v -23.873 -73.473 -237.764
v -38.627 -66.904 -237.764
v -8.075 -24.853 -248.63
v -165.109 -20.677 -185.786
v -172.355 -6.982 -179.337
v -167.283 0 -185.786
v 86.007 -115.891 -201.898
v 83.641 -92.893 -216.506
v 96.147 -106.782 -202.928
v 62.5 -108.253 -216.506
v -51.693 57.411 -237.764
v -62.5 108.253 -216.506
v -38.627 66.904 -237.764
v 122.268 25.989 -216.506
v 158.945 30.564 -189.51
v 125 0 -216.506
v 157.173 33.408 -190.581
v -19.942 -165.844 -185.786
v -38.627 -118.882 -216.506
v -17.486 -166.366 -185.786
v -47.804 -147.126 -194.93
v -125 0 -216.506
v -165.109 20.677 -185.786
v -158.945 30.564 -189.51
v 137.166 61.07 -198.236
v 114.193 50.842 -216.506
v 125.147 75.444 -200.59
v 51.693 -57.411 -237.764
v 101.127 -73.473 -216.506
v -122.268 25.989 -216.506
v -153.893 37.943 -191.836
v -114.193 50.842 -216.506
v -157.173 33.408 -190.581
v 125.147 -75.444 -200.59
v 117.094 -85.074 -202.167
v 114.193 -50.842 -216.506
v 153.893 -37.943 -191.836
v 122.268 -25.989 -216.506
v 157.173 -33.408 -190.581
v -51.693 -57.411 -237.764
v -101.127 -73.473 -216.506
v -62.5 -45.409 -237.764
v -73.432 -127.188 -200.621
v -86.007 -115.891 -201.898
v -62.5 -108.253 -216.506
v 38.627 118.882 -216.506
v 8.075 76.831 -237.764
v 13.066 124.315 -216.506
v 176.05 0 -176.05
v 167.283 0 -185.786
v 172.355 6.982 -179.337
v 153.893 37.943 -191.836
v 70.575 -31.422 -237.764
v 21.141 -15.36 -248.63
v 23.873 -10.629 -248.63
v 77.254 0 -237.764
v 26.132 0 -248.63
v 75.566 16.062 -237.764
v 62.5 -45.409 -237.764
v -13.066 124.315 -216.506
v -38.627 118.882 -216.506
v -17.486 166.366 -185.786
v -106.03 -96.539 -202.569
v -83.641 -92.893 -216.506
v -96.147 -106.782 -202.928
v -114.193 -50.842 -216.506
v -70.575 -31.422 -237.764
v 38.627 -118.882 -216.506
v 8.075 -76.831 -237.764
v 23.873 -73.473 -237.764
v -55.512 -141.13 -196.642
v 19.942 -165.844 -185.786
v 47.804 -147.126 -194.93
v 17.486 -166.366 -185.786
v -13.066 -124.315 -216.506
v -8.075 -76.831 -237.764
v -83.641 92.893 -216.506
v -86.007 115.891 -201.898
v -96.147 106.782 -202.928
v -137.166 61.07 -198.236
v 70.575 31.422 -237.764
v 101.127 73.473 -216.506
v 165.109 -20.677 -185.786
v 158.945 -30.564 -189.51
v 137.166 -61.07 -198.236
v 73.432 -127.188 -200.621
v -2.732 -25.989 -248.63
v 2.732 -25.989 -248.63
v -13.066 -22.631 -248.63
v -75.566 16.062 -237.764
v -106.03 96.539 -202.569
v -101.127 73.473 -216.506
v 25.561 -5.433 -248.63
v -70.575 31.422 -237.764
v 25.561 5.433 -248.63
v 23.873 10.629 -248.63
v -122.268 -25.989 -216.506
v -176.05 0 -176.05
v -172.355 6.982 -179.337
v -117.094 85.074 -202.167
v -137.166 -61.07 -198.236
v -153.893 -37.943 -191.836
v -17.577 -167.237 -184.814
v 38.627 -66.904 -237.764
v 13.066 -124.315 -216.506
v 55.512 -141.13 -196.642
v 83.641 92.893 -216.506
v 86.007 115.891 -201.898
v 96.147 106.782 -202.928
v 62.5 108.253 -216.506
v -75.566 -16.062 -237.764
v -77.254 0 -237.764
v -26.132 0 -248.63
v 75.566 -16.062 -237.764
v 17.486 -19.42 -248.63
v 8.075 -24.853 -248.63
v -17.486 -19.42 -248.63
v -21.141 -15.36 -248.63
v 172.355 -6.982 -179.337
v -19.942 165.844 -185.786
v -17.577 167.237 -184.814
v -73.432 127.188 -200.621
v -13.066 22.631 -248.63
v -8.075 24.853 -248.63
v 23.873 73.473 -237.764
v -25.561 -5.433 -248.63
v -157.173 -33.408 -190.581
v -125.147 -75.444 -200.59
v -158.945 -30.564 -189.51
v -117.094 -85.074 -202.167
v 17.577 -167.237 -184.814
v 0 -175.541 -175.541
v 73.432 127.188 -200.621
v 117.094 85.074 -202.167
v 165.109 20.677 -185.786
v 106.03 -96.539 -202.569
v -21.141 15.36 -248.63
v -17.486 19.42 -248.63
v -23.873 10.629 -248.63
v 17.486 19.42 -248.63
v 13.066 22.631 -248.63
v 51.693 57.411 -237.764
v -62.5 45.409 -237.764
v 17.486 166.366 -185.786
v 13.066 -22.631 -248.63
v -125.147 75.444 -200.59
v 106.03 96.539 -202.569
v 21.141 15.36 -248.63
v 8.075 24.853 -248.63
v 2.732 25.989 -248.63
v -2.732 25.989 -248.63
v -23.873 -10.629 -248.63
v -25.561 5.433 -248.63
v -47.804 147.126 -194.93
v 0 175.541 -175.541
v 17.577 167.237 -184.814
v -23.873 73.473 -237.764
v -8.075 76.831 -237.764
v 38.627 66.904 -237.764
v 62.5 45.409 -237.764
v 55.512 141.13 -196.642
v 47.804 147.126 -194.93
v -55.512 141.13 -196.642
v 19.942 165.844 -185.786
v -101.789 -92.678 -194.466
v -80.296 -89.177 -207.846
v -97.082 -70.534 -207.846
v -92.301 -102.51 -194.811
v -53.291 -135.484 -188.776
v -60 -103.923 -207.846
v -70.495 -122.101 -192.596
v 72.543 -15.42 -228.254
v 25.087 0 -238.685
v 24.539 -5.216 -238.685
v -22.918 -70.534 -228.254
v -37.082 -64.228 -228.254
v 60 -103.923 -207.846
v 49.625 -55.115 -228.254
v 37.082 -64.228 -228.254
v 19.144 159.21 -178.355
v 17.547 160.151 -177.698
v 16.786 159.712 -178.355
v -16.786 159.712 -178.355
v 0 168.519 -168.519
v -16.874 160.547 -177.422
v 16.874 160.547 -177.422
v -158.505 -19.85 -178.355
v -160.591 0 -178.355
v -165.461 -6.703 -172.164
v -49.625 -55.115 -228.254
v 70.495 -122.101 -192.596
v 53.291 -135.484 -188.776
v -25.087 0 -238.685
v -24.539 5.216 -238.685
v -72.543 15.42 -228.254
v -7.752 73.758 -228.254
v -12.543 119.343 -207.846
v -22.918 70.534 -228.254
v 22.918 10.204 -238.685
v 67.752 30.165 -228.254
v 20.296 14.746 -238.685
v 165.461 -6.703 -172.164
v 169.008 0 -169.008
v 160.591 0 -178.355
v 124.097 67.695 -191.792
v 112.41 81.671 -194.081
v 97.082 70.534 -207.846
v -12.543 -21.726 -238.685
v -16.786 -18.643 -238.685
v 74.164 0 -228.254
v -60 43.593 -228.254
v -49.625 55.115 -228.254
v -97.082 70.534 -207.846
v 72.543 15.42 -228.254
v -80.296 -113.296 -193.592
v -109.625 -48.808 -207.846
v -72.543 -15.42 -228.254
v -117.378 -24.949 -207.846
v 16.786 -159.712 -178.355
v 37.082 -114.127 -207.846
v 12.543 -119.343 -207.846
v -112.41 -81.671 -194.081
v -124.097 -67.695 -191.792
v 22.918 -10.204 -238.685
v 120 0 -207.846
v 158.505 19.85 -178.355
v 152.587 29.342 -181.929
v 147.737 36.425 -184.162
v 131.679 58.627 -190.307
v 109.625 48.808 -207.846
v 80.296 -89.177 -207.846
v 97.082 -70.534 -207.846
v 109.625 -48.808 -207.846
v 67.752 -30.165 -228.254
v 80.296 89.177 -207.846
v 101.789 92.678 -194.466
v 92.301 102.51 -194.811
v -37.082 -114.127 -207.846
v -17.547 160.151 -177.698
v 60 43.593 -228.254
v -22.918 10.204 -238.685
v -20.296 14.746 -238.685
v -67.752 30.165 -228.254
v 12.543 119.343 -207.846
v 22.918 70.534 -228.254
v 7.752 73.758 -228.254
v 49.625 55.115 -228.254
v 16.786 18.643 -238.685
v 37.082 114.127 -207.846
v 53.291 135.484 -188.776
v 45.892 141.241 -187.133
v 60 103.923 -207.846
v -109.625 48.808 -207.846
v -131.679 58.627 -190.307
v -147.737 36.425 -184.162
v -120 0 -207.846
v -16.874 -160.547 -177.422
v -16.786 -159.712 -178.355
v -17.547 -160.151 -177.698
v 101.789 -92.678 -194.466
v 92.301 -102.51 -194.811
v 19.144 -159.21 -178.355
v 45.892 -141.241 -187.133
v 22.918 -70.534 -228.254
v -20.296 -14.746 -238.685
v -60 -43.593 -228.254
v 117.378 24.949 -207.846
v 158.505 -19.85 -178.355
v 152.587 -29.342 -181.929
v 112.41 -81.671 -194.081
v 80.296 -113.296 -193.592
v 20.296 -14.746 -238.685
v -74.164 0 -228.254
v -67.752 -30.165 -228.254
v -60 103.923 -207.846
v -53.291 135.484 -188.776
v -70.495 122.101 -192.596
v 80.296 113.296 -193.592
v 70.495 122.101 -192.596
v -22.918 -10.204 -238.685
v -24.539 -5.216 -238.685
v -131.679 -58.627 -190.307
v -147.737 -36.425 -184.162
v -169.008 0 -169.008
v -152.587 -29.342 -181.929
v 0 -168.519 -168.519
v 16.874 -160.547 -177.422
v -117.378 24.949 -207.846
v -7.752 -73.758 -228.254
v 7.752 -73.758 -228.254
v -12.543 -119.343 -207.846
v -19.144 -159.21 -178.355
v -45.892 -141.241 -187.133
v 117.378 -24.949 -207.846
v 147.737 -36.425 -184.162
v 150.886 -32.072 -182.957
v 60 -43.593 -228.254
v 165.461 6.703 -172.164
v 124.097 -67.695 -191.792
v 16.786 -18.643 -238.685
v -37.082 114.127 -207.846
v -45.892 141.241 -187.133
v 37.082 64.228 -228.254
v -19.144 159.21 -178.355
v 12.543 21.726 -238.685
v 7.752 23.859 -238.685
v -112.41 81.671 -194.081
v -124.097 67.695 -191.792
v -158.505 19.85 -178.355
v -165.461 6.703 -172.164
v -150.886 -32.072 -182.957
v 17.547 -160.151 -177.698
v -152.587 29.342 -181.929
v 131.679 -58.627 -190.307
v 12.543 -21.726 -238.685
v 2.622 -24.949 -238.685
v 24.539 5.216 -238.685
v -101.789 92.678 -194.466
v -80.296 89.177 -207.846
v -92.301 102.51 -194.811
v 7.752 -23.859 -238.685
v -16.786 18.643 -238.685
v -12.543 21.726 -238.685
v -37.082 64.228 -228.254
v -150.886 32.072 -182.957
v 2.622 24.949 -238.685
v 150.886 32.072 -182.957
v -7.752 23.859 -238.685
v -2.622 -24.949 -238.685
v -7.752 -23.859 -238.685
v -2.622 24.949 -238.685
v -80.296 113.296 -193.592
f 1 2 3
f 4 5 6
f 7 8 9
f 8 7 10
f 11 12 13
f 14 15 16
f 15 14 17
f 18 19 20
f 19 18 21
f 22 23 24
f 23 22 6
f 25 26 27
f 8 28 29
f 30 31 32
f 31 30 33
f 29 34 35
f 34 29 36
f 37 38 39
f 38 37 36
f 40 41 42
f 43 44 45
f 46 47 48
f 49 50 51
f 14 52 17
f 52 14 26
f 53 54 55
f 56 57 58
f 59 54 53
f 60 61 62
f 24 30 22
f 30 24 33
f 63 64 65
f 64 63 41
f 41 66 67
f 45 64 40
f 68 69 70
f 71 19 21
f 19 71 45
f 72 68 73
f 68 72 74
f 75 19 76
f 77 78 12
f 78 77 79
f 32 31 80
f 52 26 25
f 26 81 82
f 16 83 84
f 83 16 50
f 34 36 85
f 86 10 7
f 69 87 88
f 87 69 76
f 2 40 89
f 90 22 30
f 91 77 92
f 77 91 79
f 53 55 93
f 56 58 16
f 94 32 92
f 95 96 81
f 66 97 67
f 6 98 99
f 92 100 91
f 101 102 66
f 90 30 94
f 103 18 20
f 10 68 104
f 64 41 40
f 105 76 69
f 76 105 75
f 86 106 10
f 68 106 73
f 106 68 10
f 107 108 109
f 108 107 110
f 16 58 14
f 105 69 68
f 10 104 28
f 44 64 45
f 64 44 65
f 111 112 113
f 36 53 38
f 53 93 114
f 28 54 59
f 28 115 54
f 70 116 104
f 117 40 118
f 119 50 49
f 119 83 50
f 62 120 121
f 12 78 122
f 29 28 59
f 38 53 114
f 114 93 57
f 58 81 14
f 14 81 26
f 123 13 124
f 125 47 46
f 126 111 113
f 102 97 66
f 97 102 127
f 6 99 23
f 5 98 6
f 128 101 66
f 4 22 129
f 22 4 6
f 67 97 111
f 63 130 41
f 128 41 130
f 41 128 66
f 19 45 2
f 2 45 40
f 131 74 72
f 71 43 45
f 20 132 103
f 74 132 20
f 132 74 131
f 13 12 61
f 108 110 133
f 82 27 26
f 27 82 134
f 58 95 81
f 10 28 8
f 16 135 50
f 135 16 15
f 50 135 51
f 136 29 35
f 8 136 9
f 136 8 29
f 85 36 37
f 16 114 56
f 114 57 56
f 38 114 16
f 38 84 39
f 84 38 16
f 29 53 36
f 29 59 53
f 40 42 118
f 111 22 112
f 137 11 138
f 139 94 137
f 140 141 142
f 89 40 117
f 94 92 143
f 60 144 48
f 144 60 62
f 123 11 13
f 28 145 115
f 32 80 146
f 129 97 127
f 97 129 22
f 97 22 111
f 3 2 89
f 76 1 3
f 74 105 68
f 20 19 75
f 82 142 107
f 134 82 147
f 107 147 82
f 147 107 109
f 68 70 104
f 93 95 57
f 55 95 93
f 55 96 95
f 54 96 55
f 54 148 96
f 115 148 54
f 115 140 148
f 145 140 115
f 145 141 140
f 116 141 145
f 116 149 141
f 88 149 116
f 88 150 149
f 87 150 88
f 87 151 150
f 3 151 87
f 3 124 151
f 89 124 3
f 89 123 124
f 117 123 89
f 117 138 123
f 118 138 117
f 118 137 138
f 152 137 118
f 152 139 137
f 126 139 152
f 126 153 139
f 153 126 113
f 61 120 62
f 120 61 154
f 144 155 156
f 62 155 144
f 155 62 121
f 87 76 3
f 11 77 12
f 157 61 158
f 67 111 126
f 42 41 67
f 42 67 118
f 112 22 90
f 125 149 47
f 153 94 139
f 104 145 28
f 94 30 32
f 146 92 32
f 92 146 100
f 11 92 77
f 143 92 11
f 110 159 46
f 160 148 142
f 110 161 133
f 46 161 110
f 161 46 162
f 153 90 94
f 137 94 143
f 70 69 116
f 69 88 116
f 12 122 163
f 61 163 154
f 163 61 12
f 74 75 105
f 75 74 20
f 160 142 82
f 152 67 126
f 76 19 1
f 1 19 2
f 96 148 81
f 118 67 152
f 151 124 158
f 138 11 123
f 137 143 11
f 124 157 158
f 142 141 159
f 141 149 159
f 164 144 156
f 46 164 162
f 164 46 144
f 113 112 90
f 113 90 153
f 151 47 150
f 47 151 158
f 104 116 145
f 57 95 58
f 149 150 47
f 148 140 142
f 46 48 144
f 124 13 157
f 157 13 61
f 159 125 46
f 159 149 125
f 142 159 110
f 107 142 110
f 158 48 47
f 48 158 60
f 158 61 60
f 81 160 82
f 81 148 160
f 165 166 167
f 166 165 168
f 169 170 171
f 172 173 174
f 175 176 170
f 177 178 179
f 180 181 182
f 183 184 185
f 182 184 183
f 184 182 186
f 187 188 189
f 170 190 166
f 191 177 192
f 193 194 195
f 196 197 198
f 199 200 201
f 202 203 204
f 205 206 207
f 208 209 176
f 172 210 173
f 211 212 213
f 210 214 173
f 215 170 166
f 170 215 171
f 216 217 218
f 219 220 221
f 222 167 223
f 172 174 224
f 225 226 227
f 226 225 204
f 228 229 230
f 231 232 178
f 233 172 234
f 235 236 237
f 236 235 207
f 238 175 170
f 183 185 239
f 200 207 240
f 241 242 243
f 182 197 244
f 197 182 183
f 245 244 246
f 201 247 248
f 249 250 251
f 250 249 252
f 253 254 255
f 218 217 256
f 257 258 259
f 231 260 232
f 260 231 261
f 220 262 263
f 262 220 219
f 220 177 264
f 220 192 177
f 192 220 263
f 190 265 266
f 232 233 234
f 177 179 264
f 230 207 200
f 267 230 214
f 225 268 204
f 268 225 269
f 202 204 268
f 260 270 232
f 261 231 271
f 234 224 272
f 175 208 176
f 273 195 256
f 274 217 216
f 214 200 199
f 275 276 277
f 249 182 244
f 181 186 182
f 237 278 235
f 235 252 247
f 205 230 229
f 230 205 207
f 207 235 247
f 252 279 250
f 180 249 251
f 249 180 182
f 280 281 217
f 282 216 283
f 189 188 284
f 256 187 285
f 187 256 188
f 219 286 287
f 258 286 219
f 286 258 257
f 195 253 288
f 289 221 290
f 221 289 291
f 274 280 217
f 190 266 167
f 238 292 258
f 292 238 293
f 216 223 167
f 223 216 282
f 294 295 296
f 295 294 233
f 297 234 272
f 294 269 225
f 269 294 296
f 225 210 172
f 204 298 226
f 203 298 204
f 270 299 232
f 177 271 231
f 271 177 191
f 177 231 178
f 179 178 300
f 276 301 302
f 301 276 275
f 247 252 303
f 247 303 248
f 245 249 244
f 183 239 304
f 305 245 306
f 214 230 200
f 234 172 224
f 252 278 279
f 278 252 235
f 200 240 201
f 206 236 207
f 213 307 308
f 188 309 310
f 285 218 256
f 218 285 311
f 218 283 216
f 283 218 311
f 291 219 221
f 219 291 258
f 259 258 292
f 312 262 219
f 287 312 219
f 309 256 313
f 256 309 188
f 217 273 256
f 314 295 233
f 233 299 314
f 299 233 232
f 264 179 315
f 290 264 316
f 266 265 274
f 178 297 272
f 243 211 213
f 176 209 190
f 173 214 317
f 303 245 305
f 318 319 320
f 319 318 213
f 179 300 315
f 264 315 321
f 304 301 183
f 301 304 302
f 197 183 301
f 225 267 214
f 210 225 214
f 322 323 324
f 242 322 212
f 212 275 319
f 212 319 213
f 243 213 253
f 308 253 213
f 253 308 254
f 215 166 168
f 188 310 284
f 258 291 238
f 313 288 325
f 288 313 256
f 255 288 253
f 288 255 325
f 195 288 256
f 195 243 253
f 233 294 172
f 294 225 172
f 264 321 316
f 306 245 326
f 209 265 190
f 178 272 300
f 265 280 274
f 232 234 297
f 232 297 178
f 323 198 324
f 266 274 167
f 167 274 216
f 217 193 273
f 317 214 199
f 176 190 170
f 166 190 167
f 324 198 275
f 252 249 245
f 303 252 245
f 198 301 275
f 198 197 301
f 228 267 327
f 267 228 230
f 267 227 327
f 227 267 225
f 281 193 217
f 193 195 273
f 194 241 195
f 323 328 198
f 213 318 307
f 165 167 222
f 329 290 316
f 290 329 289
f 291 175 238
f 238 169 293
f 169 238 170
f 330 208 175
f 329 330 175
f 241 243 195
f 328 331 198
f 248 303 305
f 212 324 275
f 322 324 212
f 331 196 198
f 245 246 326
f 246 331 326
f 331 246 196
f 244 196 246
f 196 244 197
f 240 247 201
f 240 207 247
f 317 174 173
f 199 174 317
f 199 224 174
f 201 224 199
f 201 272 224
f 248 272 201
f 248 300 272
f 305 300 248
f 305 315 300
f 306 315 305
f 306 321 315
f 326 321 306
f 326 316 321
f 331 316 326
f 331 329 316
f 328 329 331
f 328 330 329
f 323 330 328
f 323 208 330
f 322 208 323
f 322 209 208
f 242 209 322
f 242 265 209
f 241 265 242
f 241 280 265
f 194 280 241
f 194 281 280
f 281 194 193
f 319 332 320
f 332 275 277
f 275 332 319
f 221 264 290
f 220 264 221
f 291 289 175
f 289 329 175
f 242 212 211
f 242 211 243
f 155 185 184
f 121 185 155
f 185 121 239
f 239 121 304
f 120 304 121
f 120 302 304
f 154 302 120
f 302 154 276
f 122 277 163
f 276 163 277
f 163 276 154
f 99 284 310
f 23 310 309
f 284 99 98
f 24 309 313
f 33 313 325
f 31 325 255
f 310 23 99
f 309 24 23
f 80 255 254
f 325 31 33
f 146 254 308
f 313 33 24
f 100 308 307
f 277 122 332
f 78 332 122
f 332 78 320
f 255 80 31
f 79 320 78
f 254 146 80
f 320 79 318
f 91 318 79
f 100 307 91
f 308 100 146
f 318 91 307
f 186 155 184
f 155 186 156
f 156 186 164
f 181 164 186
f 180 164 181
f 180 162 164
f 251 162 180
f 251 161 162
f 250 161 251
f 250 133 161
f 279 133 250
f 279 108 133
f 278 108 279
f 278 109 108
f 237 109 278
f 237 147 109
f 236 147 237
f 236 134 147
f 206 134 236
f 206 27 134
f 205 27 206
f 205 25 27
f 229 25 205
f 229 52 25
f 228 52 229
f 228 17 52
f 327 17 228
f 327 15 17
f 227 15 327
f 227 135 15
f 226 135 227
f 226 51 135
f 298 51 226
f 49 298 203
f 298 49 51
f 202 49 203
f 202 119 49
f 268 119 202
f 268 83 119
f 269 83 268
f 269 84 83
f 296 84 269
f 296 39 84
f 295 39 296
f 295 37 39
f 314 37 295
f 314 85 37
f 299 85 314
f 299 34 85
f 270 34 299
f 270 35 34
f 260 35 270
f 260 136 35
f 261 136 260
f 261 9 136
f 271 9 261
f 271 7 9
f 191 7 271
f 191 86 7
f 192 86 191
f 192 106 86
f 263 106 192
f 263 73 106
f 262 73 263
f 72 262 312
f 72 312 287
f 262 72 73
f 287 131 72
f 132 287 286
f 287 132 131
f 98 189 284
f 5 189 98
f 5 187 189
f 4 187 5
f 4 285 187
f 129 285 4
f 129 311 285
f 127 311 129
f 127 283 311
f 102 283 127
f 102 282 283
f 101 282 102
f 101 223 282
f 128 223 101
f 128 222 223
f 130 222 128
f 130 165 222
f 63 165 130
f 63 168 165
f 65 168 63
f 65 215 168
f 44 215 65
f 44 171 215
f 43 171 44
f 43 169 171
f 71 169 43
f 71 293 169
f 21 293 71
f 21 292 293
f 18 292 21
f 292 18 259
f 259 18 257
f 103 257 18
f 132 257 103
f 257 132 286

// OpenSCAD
// file: ../../configure.scad
rad=500/2;
wall=9;

slop = .2;

in = 25.4;

//wheel and axle variables
wheel_bore_rad = 12/2;
wheel_rad = 84/2;
wheel_thick = 64;
wheel_clearance = 81;

m4_bearing_rad = 9/2+slop;
m4_bearing_height = 4;
m4_bearing_race_rad = (9+4)/4;

axle_rad = 10/2+slop;

//motor variables
motor_rad = 37/2;
motor_mount_screw_sep = 50;
motor_shaft_rad = 6/2;
motor_shaft_dflat = .25;

//standard screw variables
m3_nut_rad = 6.01/2+slop;
m3_nut_height = 2.4;
m3_rad = 3/2+slop;
m3_cap_rad = 3.25;
m3_cap_height = 2;
m3_square_nut_rad = 6*sqrt(2)/2;
m3_sq_nut_rad = m3_square_nut_rad;

m4_nut_rad = 7*sqrt(2)/2+slop;
m4_nut_height = 3;
m4_rad = 4/2+slop+.1;
m4_cap_rad = 4.25;
m4_cap_height = 2;
m4_square_nut_rad = 11.0/2;
m4_tap_rad = 4/2-slop;

m5_nut_rad = 8*sqrt(2)/2+slop;
m5_nut_height = 3.5;
m5_rad = 5/2+slop+.1;
m5_cap_rad = 5.25;
m5_cap_height = 3;

module d_slot(shaft=motor_shaft_rad*2, height=10, tolerance = slop, dflat=motor_shaft_dflat, double_d=false){
    translate([0,0,-.1]){
       difference(){ 
           cylinder(r=shaft/2+tolerance, h=height+.01);
           translate([-shaft/2,shaft/2-dflat,0]) cube([shaft, shaft, height+.01]);
           if(double_d==true){
               mirror([0,1,0]) translate([-shaft/2,shaft/2-dflat,0]) cube([shaft, shaft, height+.01]);
           }
       }
    }
}
// main file
include <../../configure.scad>




triangle = 5;


m6_tap_rad = 6/2-.5;
m6_rad = 6/2+.5;


face = 27;


washer_rad = 10.1/2+slop;
washer_thick = 1.05;
washer_angle = 9;

corner_tab_rad = 70;

assembled = true;
textured = false;

facets = 30;

%cube([200,200,.1], center=true);

//cone_face();
//rotate([0,0,22.5]) rotate([0,22.5,0]) translate([-rad,0,0]) rotate([0,-90,0]) corner_tab(printing = true);

cuboctahedron_points = [
    [1,1,0],    //0
    [1,-1,0],   //1
    [-1,1,0],   //2
    [-1,-1,0],  //3
    [1,0,1],   //4
    [1,0,-1],  //5
    [-1,0,1],  //6
    [-1,0,-1], //7
    [0,1,1],   //8
    [0,1,-1],  //9
    [0,-1,1],  //10
    [0,-1,-1], //11
    [0,0,0]
];
    


cuboctahedron();
!cuboctahedron_square();

module cuboctahedron_square(){
    %rotate([0,0,45]) cube([300,300,300], center=true);
    intersection(){
        difference(){
            sphere(r=250);
            sphere(r=240);
        }
        
        scale([300,300,300])
        polyhedron(points=cuboctahedron_points, faces=[
            [5,9,7],
            [11,5,7],  //-z bottom face
            [9,12,7],
            [5,12,9],
            [11,12,5],
            [7,12,11],
        ]);
    }
}

module cuboctahedron(){
    cuboctahedron_points = [
    [1,1,0],    //0
    [1,-1,0],   //1
    [-1,1,0],   //2
    [-1,-1,0],  //3
    [1,0,1],   //4
    [1,0,-1],  //5
    [-1,0,1],  //6
    [-1,0,-1], //7
    [0,1,1],   //8
    [0,1,-1],  //9
    [0,-1,1],  //10
    [0,-1,-1], //11
    [0,0,0]     //12
    ];
    
    polyhedron(
  points=cuboctahedron_points,         
  faces=[
    [7,9,5],
    [7,5,11],  //-z bottom face
    
    [6,8,4],
    [6,4,10],  //z top face
    
    [2,3,7],
    [2,6,3],  //-x left face
    
    [0,1,5],
    [0,4,1],  //x right face
    
    [1,3,10],
    [1,11,3],  //-y back face
    
    [0,2,8],
    [0,9,2]  //y front face
    
    //eight triangles
    
    ]
 );
}

if(face <= 25){
    if(assembled == false){
        //this is rotated for printing
        rotate([0,0,-5]) rhombioctahedron_printface(face=face, textured=textured);
    }else{
        //this is assembled as a sphere
        rhombioctahedron_face(face=face, textured=textured);
    }
}

if(face == 26)
    corner_tab(printing=true);

if(face == 27)
    assembly();

module assembly(){
    rhombioctahedron_face(face=7, textured=textured);
    rhombioctahedron_face(face=13, textured=textured);
    rhombioctahedron_face(face=15, textured=textured);
    rhombioctahedron_face(face=22, textured=textured);
    rhombioctahedron_face(face=23, textured=textured);
    rhombioctahedron_face(face=24, textured=textured);
    rhombioctahedron_face(face=25, textured=textured);
    corner_tab_array(printing=true);
    //rhombioctahedron_face(face=face, textured=textured);
    //rhombioctahedron_face(face=face, textured=textured);
}

module cone_face(){
    intersection(){
        cylinder(r=150, h = 500);
        
        bb8_texture_shallow();
    }
}

module screwhole(rad = m4_rad, nut_rad = m4_nut_rad){
    angle=45;
    
    inset = 5;
    straight = 10;
    flare = .75;
    
    translate([0,-1.5,0]){
        translate([0,0,-.1]) cylinder(r=rad, h=wall, $fn=18);
        translate([0,0,inset]) rotate([0,0,angle]) cylinder(r1=nut_rad, r2=nut_rad+flare, h=straight, $fn=4);
        hull(){
            translate([0,0,straight+inset]) rotate([0,0,angle]) cylinder(r=nut_rad+flare, h=.2, $fn=4, center=true);
            translate([0,0,wall*2.5]) rotate([51,0,0]) translate([0,0,straight+inset]) rotate([0,0,angle]) cylinder(r=nut_rad+5, h=.2, $fn=4, center=true);
        }
        //translate([0,0,straight+inset-1]) rotate([30,0,0]) rotate([0,0,angle]) cylinder(r1=nut_rad+flare, r2=nut_rad+3, h=wall*3, $fn=4);
    }
}

module magnethole(rad = m4_rad, nut_rad = m4_nut_rad){
    angle=45;
    
    inset = 1;
    straight = 13;
    flare = .5;
    
    translate([0,-1.5,0]){
        translate([0,0,inset]) rotate([0,0,angle]) cylinder(r1=nut_rad, r2=nut_rad+flare, h=straight+1.4, $fn=4);
    }
}


module washer(){
    cylinder(r=washer_rad, h=washer_thick, center=true);
    hull(){
        translate([0,0,washer_thick/2]) cylinder(r1=washer_rad*.75, r2=1, h=washer_thick/3);
        rotate([180,0,0]) translate([0,0,washer_thick/2]) cylinder(r1=washer_rad*.75, r2=1, h=washer_thick/3);
    }
}

//STL of the full BB8, centered, rotated, scaled, sized, etc.
module bb8_texture(){
    s=6.41;
    //scale([s,s,s]) rotate([0,0,-27.5]) rotate([0,3.6,0]) rotate([29.25,0,0])import("bb8_union_rep_simplified.stl");
    
    scale([s,s,s]) import("body_solid.stl");
}

module bb8_texture_shallow(){
        s=6.41;
    //scale([s,s,s]) rotate([0,0,-27.5]) rotate([0,3.6,0]) rotate([29.25,0,0])import("bb8_union_rep_simplified.stl");

    rotate([12, 44, 111]) union(){
        scale([s,s,s]) import("body_solid.stl");
        sphere(r=rad-.5, $fn=facets);
    }
}

module rhombioctahedron_printface(face=0, textured=false){
    bottom = -rad+39;
    
    if(face >=0 && face <= 7)
        difference(){
            rotate([22.5,0,0])
            rotate([0,0,-45*face]) rhombioctahedron_face(face=face, textured=textured);
        }
    
    //meridianal faces
    if(face > 7 && face <= 10)
        if(face == 8 || face == 10){
            difference(){
                rotate([22.5,0,0])  rotate([-(face-7)*45,0,0]) rhombioctahedron_face(face=face, textured=textured);
            }
        }else{
            difference(){
                //translate([0,0,bottom]) 
                rotate([22.5,0,0]) rotate([-(face-7)*45,0,0]) rhombioctahedron_face(face=face, textured=textured);
                //a little bottom flattening
                translate([0,0,-100]) cube([200,200,200], center=true);
            }
        }
    if(face > 10 && face <= 13)
        if(face == 11 || face == 13){
            difference(){
                rotate([22.5,0,0]) rotate([0,90,0]) rotate([-(face-6)*45,0,0]) rhombioctahedron_face(face=face, textured=textured);
            }
        }else{
            difference(){
                rotate([22.5,0,0]) rotate([-(face-6)*45,0,0]) rhombioctahedron_face(face=face, textured=textured);
            }   
        }
    
    if(face > 13 && face <= 17)
        difference(){
            rotate([22.5,0,0]) rotate([0,0,-45-(face-13)*90]) rotate([-90,0,0]) rhombioctahedron_face(face=face, textured=textured);
        }
    
    //triangles
    if(face > 17 && face <= 21)
        difference(){
            //printing orientation: rotate([0,0,90*(face-18)]) triangle_face();
            rotate([-22.5,0,0]) rotate([0,0,45]) rotate([0,0,-90*(face-18)]) rhombioctahedron_face(face=face, textured=textured);
        }
    if(face == 22 || face == 24)
        {
            //rotate([-22.5,0,0]) rotate([0,0,45]) mirror([0,0,1]) rotate([0,0,-90*(face-18)]) rhombioctahedron_face(face=face, textured=textured);
            //printing orientation: rotate([180,0,0]) rotate([0,0,90*(face-19)]) triangle_face();
            echo(face);
            echo(90*(25-face));
            rotate([0,0,-90]) rotate([0,-22.5,0]) rotate([0,0,45]) rotate([-180,0,0]) rotate([0,0,90*(25-face)]) rhombioctahedron_face(face=face, textured=textured);
        }
        
        if(face == 23 || face == 25)
        {
            //rotate([-22.5,0,0]) rotate([0,0,45]) mirror([0,0,1]) rotate([0,0,-90*(face-18)]) rhombioctahedron_face(face=face, textured=textured);
            //printing orientation: rotate([180,0,0]) rotate([0,0,90*(face-19)]) triangle_face();
            echo(face);
            echo(90*(25-face));
            rotate([0,0,90]) rotate([0,22.5,0]) rotate([0,0,45]) rotate([-180,0,0]) rotate([0,0,90*(25-face)]) rhombioctahedron_face(face=face, textured=textured);
        }
}

module rhombioctahedron_face(face=0, textured=false){
    difference(){
    intersection(){
        union(){
            //equatorial faces
            if(face >=0 && face <= 7)
                rotate([0,0,45*face]) square_face();
            
            //meridianal faces
            if(face > 7 && face <= 10)
                rotate([(face-7)*45,0,0]) square_face();
            if(face > 10 && face <= 13)
                rotate([(face-6)*45,0,0]) square_face();
            
            if(face > 13 && face <= 17)
                rotate([90,0,0]) rotate([0,0,45+(face-13)*90]) square_face();
        
            //triangles
            if(face > 17 && face <= 21)
                rotate([0,0,90*(face-18)]) triangle_face();
            if(face > 21 && face <= 25){
                rotate([180,0,0]) rotate([0,0,90*(face-22)]) triangle_face();
                echo(90*(face-22));
            }
        }
        
        if(textured==true){
            bb8_texture_shallow();
        }else{
            sphere(r=rad, $fn=facets);
        }
    }
    
    //to ensure global hole matching, we subtract ALL holes here.
    corner_tab_array();
    }
}

module rhombioctahedron(){
    //%cylinder(r=150, h=600, center=true);
    %cube([200,200,600], center=true);
    intersection(){
        union(){
            for(i=[0:45:359]) rotate([0,0,i]) 
                 translate([0,1,0]) square_face();
            for(i=[45:45:179]) rotate([i,0,0]) 
                translate([0,1,0]) square_face();
            for(i=[225:45:359]) rotate([i,0,0]) 
                translate([0,1,0]) square_face();
            for(i=[45:90:359]) rotate([90,0,0]) rotate([0,0,i]) 
                translate([0,1,0]) square_face();
        
            //triangles
            for(i=[0:90:359]) rotate([0,0,i])
                translate([1,1,1]) triangle_face();
            for(i=[0:90:359]) mirror([0,0,1]) rotate([0,0,i])
                translate([1,1,1]) triangle_face();
        }
        
        bb8_texture_shallow();

    }
}

module corner_tab_array(printing=false){
    //these hit the corners of panels 0, 2, 4 and 6
    for(i=[0:90:359]) rotate([0,0,i]) {
        rotate(a=30, v=[1,0,1]) translate([0,rad,0]) rotate([-90,0,0]) corner_tab(printing=printing);
        rotate(a=30, v=[-1,0,-1]) translate([0,rad,0]) rotate([-90,0,0]) corner_tab(printing=printing);
        rotate(a=30, v=[1,0,-1]) translate([0,rad,0]) rotate([-90,0,0]) corner_tab(printing=printing);
        rotate(a=30, v=[-1,0,1]) translate([0,rad,0]) rotate([-90,0,0]) corner_tab(printing=printing);
    }
    
    //this does the top and bottom
    for(i=[90:180:359]) rotate([i,0,0]) {
        rotate(a=30, v=[1,0,1]) translate([0,rad,0]) rotate([-90,0,0]) corner_tab(printing=printing);
        rotate(a=30, v=[-1,0,-1]) translate([0,rad,0]) rotate([-90,0,0]) corner_tab(printing=printing);
        rotate(a=30, v=[1,0,-1]) translate([0,rad,0]) rotate([-90,0,0]) corner_tab(printing=printing);
        rotate(a=30, v=[-1,0,1]) translate([0,rad,0]) rotate([-90,0,0]) corner_tab(printing=printing);
    }
    
}

module corner_tab_holes(tap = true){
    side = corner_tab_rad;
    screw_rad = (tap)?4/2+slop:5/2+slop;
    screw_cap_rad = 10/2;
    screw_cap_height = 2.25;
    cap_offset = 1-.5;
    
    for(i=[0:1]) for(j=[0:1]) mirror([i,0,0]) mirror([0,j,0]) translate([side/3.75, side/3.75,0]){
        cylinder(r=screw_rad, h=wall*3, center=true, $fn=facets);
        
        //cap
        translate([0,0,cap_offset]){
            cylinder(r1=screw_rad, r2=screw_cap_rad, h=screw_cap_height, $fn=facets);
            translate([0,0,screw_cap_height-.01]) cylinder(r=screw_cap_rad, h=wall, $fn=facets);
        }
    }
}

module corner_tab(printing = 1){
    side = corner_tab_rad;
    inset = -wall-1;
    height = wall/2+abs(inset/2);
    slope = 5;
    
    if(printing == true){
        difference(){
            union(){
                translate([0,0,inset]) cylinder(r1=side/2+slope, r2=side/2, h=height, center=true, $fn = facets);
                translate([0,0,inset]) cylinder(r1=side/2+slope+slope, r2=side/2+slope, h=height, center=true, $fn = 3);
            }
            
            //curve the inner side
            translate([0,0,-rad]) sphere(r=rad-wall, $fn=facets);
            
            translate([0,0,inset+height/2]) corner_tab_holes(tap = true, side=side);
        }
    }else{
        union(){
            difference(){
                union(){
                    translate([0,0,inset]) cylinder(r1=side/2+slope+slop*2, r2=side/2+slop*2, h=height+slop*2, center=true, $fn = facets);
                    translate([0,0,inset]) cylinder(r1=side/2+slope+slope+slop*2, r2=side/2+slope+slop*2, h=height, center=true, $fn = 3);
                }
                
                //curve the inner side
                translate([0,0,-rad-wall]) sphere(r = rad-wall, $fn = facets);
            }
            translate([0,0,inset+height/2]) corner_tab_holes(tap = false, side=side);
        }
    }
}

module square_face(){
    face = rad;
    difference(){
        union(){
            intersection(){
                rotate([-45/2,0,0]) translate([-face/2,0,0]) cube([face,face,face]);
                rotate([-135/2,0,0]) translate([-face/2,0,0]) cube([face,face,face]);
                rotate([0,90,0]) rotate([-45/2,0,0]) translate([-face/2,0,0]) cube([face,face,face]);
                rotate([0,90,0]) rotate([-135/2,0,0]) translate([-face/2,0,0]) cube([face,face,face]);
            }
            
            *for(i=[0:90:359]) for(j=[0:1]) mirror([j,0,0]) rotate([0,i,0]) rotate([-22.5,0,0]) rotate([0,0,washer_angle]) translate([0,rad-wall,0]) rotate([90,0,0]) screw_tab(solid=1, tab=j);
        }
        //hollow out the inside
        sphere(r=rad-wall, $fn=facets);
    }
}

module triangle_face(){
    face = rad;
    difference(){
        intersection(){
            rotate([45,0,0]) rotate([0,0,-45])
                rotate([0,90,0]) rotate([-45/2,0,0]) translate([-face/2,0,0]) cube([face,face,face]);
        
            rotate([0,0,-45]) rotate([45,0,0])
                rotate([-45/2,0,0]) translate([-face/2,0,0]) cube([face,face,face]);
        
            rotate([0,0,-45-45]) rotate([45,0,0]) rotate([0,0,45]) 
                rotate([0,90,0]) rotate([-135/2,0,0]) translate([-face/2,0,0]) cube([face,face,face]);
        }
        
        //hollow out the inside
        sphere(r=rad-wall, $fn=facets);
    }
}
